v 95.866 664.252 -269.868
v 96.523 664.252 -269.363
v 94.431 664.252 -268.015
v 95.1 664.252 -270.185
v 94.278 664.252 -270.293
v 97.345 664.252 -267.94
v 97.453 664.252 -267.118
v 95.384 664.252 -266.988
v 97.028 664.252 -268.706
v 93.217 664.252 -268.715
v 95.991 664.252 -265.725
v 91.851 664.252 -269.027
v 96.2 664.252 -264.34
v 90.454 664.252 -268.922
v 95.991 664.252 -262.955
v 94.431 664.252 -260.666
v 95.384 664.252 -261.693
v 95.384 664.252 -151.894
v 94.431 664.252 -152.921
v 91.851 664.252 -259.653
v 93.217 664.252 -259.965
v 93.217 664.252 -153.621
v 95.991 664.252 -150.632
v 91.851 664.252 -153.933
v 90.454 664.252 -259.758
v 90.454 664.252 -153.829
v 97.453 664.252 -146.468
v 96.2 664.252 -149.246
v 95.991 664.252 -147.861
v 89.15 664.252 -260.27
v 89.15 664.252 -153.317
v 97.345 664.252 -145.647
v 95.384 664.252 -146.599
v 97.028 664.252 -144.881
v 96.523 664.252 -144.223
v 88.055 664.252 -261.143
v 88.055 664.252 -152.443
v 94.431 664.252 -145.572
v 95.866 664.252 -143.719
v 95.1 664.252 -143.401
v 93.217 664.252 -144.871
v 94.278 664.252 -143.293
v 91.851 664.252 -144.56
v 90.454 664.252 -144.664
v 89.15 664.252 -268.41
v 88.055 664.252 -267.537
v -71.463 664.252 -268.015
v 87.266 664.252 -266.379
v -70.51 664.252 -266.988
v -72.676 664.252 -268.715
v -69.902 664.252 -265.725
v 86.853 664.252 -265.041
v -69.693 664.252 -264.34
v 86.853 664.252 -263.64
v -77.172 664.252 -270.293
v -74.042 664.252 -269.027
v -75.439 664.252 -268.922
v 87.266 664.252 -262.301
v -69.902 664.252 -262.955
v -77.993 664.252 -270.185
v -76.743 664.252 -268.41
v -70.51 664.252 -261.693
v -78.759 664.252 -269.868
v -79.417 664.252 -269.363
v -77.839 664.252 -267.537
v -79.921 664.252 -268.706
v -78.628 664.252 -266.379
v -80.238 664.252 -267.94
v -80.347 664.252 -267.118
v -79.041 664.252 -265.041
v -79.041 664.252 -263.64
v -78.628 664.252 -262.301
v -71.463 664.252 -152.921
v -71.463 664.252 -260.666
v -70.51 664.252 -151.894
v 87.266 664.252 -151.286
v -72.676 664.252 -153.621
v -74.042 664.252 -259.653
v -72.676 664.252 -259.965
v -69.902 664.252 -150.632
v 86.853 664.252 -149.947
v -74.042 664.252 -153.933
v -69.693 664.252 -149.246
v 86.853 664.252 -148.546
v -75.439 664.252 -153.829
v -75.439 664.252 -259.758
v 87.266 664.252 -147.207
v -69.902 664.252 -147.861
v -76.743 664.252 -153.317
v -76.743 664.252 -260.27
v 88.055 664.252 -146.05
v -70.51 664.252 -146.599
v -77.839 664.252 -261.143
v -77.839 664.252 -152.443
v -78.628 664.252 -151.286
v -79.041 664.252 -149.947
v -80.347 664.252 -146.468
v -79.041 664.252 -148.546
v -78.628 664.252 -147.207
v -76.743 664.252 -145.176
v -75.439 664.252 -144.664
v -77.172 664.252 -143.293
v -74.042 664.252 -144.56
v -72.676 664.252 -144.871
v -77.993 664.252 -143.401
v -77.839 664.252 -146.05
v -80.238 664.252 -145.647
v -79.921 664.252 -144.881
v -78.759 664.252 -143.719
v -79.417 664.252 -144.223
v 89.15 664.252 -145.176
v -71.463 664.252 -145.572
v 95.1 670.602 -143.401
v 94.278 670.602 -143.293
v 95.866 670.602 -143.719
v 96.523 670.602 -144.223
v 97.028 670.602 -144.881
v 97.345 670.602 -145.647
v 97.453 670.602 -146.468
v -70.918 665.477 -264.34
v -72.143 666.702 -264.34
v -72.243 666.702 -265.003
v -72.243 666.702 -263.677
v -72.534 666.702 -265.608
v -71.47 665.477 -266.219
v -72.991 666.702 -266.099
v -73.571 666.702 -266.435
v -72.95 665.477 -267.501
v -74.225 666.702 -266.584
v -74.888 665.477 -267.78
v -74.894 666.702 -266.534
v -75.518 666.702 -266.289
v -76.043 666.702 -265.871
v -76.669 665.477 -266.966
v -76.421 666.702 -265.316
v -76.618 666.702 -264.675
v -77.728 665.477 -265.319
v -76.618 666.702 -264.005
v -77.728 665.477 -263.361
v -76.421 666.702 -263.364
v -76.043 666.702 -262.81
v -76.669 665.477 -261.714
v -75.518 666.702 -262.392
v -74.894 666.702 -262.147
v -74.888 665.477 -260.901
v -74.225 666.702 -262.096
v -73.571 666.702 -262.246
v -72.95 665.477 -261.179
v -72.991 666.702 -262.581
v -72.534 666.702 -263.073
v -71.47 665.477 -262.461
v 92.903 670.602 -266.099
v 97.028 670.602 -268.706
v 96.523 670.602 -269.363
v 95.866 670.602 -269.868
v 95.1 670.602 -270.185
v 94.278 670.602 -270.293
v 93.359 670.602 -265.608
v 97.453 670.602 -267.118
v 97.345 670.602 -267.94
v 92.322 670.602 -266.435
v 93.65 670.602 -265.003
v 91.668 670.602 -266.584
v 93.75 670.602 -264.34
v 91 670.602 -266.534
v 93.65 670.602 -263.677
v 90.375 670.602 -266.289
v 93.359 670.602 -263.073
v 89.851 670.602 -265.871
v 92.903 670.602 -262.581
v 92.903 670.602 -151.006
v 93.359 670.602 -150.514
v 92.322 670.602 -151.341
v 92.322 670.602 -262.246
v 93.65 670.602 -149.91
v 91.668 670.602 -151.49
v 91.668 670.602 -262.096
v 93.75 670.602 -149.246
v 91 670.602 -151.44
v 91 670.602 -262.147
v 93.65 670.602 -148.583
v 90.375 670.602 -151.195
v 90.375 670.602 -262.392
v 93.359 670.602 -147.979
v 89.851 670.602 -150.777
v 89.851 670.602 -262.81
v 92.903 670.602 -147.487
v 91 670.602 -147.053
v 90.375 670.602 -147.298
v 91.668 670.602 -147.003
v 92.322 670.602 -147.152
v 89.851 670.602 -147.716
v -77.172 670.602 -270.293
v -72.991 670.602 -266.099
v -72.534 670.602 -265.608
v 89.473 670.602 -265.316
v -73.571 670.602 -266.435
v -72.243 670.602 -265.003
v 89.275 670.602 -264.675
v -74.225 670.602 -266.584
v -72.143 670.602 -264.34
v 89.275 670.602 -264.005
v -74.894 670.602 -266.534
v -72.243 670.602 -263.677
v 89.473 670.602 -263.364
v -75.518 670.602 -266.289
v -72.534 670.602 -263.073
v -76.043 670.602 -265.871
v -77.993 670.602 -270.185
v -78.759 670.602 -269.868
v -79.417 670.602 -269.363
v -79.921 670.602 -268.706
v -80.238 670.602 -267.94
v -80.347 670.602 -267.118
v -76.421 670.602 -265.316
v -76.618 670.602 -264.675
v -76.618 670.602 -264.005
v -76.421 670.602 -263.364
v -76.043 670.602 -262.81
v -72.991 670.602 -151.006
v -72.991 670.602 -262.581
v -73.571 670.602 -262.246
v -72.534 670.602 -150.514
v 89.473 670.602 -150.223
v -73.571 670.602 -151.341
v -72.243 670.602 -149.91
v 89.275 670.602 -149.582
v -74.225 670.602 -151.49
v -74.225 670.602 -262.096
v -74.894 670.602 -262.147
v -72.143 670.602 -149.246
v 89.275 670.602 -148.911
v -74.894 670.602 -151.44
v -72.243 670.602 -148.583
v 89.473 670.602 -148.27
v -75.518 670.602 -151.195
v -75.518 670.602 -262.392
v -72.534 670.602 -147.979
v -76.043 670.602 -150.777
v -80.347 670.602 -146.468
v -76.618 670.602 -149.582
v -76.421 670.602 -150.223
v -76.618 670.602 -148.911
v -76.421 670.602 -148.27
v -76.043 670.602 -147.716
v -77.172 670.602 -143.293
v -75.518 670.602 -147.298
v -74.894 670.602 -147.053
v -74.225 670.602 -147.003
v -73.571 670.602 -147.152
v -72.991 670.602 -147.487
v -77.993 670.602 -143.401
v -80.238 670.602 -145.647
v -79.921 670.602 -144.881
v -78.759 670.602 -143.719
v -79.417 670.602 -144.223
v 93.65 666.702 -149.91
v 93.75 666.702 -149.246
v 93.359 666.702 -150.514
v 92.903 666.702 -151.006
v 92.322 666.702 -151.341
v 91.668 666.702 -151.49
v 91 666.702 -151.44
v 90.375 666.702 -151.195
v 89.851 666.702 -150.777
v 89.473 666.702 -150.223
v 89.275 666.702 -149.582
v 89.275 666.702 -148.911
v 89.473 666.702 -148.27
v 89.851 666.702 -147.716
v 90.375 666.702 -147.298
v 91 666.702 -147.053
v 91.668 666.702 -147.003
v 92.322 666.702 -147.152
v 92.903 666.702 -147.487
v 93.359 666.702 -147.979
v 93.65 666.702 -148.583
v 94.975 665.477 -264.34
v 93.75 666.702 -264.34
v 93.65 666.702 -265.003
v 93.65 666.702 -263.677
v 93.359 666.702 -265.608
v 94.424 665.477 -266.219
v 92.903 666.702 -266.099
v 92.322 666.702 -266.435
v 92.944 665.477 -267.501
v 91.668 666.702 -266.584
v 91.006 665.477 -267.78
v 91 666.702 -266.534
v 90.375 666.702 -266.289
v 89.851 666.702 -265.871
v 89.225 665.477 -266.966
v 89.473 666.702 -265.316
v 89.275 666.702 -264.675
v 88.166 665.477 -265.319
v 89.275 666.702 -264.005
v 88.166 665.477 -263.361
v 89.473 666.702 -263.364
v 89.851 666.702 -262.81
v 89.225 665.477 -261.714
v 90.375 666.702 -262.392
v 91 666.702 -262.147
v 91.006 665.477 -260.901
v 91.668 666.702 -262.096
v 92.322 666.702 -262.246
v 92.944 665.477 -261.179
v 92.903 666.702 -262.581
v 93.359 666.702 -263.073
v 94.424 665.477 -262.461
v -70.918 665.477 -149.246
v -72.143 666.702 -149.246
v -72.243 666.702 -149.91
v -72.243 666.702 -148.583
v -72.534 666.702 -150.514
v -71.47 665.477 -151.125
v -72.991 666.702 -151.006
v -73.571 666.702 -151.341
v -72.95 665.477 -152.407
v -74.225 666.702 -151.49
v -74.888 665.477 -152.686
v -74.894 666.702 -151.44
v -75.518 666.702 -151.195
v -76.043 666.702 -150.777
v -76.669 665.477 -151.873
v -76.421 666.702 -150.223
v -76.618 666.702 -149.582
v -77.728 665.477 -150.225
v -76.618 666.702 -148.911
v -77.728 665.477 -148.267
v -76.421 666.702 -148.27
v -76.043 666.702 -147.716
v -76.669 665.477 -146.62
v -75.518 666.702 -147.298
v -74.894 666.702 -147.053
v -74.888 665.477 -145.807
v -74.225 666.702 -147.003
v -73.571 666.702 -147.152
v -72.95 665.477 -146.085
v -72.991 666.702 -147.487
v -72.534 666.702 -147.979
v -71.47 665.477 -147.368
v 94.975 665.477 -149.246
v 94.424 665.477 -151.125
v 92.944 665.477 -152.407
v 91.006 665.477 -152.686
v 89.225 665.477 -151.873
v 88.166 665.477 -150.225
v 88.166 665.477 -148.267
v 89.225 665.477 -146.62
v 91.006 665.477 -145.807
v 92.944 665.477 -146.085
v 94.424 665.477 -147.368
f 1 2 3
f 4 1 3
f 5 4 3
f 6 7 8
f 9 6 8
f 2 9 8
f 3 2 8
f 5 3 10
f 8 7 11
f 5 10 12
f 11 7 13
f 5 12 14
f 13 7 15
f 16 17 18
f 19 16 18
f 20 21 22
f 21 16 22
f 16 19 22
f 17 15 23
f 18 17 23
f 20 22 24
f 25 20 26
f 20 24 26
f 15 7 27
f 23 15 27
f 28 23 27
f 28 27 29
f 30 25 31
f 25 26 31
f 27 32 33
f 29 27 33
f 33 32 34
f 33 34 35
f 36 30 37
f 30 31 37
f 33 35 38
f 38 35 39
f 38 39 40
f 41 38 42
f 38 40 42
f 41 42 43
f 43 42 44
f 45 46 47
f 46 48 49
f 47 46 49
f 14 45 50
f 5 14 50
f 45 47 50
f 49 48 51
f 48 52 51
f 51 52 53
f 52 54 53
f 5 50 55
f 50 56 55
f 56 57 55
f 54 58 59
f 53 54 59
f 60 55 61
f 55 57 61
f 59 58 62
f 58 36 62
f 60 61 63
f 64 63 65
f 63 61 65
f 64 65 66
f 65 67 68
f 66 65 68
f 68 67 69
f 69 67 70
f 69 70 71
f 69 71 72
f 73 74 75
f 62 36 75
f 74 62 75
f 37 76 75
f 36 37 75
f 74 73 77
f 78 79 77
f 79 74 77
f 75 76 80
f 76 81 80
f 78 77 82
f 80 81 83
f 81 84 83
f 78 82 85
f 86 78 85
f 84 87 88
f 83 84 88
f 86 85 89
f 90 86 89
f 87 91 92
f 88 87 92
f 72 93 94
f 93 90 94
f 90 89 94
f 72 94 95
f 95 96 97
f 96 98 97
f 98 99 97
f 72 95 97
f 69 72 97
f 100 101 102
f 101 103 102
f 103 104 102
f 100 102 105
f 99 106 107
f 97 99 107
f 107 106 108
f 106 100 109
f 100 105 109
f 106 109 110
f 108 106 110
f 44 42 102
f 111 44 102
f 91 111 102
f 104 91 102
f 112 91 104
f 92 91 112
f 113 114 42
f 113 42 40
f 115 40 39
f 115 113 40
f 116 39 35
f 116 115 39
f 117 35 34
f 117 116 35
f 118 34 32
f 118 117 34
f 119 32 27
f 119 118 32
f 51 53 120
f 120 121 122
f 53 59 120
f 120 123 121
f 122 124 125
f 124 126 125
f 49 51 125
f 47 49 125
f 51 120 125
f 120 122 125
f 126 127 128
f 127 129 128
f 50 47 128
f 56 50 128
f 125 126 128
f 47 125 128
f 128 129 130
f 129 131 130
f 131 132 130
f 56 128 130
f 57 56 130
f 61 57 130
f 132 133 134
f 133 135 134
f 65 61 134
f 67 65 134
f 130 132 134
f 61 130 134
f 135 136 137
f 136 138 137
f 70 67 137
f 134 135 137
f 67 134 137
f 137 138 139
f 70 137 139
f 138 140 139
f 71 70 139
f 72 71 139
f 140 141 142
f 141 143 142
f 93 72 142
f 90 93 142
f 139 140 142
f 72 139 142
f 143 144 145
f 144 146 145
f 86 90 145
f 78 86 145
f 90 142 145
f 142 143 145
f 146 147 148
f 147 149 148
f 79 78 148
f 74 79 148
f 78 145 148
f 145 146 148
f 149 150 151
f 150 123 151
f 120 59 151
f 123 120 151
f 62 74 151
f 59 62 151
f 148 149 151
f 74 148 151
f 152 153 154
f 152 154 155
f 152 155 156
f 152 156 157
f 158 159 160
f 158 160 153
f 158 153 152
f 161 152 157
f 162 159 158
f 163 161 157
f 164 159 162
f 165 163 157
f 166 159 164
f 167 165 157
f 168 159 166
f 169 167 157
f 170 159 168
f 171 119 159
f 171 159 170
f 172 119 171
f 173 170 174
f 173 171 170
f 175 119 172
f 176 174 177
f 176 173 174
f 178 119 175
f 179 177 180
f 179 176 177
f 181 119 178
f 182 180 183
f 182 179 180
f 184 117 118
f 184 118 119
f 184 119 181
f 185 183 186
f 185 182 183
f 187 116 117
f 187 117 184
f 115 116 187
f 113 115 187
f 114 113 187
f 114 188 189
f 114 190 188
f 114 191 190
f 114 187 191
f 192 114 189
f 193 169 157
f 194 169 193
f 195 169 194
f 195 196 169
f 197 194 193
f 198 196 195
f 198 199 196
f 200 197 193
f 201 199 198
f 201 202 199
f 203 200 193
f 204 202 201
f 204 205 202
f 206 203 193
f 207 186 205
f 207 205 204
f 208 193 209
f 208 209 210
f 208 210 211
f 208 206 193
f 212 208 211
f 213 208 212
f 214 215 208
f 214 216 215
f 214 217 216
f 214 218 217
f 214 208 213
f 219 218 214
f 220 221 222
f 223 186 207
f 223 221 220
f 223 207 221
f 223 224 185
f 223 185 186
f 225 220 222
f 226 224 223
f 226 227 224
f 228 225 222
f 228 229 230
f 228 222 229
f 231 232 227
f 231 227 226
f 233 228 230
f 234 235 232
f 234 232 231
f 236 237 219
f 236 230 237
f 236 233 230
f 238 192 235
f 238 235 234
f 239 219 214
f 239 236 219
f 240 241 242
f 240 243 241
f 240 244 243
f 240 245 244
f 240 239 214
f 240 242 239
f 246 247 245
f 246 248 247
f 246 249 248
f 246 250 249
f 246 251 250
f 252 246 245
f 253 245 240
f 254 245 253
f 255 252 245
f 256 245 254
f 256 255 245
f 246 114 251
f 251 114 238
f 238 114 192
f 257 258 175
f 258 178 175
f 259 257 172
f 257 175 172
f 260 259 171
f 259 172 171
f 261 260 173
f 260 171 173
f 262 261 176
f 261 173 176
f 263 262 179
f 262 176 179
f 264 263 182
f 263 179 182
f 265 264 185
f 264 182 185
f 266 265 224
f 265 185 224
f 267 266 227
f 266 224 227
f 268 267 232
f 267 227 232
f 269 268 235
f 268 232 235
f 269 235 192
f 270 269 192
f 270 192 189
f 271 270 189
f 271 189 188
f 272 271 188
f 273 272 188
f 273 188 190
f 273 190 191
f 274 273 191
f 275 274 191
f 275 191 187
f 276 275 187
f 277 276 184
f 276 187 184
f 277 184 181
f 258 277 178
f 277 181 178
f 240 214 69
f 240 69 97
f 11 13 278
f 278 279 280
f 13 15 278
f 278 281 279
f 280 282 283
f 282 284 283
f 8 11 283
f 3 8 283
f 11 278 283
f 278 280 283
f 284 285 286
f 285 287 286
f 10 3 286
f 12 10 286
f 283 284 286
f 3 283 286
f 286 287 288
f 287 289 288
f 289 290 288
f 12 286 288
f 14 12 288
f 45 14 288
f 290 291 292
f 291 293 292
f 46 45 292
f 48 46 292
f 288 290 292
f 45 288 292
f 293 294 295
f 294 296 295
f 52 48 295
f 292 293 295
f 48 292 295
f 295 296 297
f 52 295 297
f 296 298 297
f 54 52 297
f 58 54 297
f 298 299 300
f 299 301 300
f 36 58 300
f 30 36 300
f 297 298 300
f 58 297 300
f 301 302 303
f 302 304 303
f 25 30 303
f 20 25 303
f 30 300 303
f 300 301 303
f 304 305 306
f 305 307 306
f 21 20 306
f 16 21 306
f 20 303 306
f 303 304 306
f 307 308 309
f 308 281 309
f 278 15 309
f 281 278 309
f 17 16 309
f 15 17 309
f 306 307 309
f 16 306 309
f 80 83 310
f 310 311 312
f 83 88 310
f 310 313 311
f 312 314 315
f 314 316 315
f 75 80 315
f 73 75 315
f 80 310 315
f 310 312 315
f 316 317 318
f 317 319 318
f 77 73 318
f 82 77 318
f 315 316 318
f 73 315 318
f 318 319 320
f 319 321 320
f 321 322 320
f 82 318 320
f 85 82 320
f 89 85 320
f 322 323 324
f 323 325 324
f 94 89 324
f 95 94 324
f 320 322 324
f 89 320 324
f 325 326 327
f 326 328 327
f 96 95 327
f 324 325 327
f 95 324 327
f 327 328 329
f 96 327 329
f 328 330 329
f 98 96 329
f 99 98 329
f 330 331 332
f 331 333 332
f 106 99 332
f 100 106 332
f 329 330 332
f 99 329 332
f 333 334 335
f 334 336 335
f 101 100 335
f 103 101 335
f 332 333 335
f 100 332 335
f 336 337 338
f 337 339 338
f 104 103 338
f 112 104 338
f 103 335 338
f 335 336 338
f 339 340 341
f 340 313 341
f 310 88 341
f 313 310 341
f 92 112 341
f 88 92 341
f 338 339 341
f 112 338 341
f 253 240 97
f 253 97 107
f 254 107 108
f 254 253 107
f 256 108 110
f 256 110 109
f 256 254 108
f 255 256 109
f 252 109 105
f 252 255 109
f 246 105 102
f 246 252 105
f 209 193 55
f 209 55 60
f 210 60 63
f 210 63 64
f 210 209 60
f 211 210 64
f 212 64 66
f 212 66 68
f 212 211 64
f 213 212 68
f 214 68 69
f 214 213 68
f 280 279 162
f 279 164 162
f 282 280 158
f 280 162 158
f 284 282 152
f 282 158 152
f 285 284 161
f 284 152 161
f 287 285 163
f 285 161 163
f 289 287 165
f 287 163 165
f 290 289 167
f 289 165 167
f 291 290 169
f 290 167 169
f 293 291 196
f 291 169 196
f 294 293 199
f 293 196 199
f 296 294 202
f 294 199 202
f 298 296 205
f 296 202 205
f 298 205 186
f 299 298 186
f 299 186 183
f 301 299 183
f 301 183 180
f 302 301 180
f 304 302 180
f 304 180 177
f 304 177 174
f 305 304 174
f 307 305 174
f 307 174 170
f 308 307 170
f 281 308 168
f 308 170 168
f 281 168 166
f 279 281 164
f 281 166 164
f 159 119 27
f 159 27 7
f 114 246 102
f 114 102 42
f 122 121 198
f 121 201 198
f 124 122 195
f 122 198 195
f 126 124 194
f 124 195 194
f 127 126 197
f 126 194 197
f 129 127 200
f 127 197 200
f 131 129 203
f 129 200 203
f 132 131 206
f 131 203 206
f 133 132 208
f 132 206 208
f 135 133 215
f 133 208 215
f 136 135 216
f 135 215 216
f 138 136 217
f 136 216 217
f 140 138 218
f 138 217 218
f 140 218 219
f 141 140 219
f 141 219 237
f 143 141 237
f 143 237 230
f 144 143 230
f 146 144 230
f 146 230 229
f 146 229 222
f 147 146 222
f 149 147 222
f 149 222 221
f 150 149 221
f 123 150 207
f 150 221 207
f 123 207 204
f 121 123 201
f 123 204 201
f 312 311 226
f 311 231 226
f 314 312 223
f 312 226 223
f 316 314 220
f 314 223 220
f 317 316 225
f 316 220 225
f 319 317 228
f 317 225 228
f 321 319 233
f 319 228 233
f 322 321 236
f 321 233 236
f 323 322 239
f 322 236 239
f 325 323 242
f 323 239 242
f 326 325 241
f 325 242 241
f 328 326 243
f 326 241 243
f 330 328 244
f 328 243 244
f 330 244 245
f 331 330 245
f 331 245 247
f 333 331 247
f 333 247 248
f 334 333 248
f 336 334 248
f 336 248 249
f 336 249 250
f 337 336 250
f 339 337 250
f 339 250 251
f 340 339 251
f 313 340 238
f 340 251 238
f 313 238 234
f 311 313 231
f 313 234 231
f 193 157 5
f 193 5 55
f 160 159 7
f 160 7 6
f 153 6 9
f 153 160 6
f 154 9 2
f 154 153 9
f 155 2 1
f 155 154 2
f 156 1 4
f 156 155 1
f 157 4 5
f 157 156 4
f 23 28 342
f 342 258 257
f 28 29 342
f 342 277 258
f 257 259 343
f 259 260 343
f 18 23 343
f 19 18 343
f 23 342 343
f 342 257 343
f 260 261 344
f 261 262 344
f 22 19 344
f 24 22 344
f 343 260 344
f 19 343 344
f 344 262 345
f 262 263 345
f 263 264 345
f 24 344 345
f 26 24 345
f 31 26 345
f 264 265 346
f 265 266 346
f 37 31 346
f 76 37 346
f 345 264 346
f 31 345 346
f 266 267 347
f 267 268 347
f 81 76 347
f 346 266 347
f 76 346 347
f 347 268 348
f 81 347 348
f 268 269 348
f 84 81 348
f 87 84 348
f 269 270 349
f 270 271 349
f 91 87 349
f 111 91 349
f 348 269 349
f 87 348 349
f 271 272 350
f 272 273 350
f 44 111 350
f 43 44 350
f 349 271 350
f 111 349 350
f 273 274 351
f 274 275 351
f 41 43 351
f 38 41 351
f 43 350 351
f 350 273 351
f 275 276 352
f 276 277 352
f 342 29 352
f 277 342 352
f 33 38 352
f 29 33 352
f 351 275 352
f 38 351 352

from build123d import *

# Parameters (mm, degrees)
BOSS_EXTRUDE1_DEPTH                             = 6.35
CSK_FOR_M4_FLAT_HEAD_MACHINE_SCREW1_D           = 4.5
CSK_FOR_M4_FLAT_HEAD_MACHINE_SCREW1_CSINK_D     = 9.4
CSK_FOR_M4_FLAT_HEAD_MACHINE_SCREW1_CSINK_ANGLE = 90


with BuildPart() as part:
    # Sketch1 → Boss-Extrude1 (new body)
    with BuildSketch(Plane.XZ.offset(-670.601916524)):
        with BuildLine():
            Line((-77.171622513, -143.293254717), (94.278377487, -143.293254717))
            ThreePointArc((94.278377487, -143.293254717), (96.523441517, -144.223190687), (97.453377487, -146.468254717))
            Line((97.453377487, -146.468254717), (97.453377487, -267.118254717))
            ThreePointArc((97.453377487, -267.118254717), (96.523441517, -269.363318747), (94.278377487, -270.293254717))
            Line((94.278377487, -270.293254717), (-77.171622513, -270.293254717))
            ThreePointArc((-77.171622513, -270.293254717), (-79.416686543, -269.363318747), (-80.346622513, -267.118254717))
            Line((-80.346622513, -267.118254717), (-80.346622513, -146.468254717))
            ThreePointArc((-80.346622513, -146.468254717), (-79.416686543, -144.223190687), (-77.171622513, -143.293254717))
        make_face()
    extrude(amount=BOSS_EXTRUDE1_DEPTH)

    # CSK for M4 Flat Head Machine Screw1 (through all)
    with Locations(Plane(origin=(0, 664.251916524, 0), x_dir=(-1, 0, 0), z_dir=(0, -1, 0))):
        with Locations((-91.500252487, 149.246379717), (-91.500252487, 264.340129717), (74.393497513, 264.340129717), (74.393497513, 149.246379717)):
            CounterSinkHole(CSK_FOR_M4_FLAT_HEAD_MACHINE_SCREW1_D / 2, CSK_FOR_M4_FLAT_HEAD_MACHINE_SCREW1_CSINK_D / 2, counter_sink_angle=CSK_FOR_M4_FLAT_HEAD_MACHINE_SCREW1_CSINK_ANGLE)


solid = part.part
